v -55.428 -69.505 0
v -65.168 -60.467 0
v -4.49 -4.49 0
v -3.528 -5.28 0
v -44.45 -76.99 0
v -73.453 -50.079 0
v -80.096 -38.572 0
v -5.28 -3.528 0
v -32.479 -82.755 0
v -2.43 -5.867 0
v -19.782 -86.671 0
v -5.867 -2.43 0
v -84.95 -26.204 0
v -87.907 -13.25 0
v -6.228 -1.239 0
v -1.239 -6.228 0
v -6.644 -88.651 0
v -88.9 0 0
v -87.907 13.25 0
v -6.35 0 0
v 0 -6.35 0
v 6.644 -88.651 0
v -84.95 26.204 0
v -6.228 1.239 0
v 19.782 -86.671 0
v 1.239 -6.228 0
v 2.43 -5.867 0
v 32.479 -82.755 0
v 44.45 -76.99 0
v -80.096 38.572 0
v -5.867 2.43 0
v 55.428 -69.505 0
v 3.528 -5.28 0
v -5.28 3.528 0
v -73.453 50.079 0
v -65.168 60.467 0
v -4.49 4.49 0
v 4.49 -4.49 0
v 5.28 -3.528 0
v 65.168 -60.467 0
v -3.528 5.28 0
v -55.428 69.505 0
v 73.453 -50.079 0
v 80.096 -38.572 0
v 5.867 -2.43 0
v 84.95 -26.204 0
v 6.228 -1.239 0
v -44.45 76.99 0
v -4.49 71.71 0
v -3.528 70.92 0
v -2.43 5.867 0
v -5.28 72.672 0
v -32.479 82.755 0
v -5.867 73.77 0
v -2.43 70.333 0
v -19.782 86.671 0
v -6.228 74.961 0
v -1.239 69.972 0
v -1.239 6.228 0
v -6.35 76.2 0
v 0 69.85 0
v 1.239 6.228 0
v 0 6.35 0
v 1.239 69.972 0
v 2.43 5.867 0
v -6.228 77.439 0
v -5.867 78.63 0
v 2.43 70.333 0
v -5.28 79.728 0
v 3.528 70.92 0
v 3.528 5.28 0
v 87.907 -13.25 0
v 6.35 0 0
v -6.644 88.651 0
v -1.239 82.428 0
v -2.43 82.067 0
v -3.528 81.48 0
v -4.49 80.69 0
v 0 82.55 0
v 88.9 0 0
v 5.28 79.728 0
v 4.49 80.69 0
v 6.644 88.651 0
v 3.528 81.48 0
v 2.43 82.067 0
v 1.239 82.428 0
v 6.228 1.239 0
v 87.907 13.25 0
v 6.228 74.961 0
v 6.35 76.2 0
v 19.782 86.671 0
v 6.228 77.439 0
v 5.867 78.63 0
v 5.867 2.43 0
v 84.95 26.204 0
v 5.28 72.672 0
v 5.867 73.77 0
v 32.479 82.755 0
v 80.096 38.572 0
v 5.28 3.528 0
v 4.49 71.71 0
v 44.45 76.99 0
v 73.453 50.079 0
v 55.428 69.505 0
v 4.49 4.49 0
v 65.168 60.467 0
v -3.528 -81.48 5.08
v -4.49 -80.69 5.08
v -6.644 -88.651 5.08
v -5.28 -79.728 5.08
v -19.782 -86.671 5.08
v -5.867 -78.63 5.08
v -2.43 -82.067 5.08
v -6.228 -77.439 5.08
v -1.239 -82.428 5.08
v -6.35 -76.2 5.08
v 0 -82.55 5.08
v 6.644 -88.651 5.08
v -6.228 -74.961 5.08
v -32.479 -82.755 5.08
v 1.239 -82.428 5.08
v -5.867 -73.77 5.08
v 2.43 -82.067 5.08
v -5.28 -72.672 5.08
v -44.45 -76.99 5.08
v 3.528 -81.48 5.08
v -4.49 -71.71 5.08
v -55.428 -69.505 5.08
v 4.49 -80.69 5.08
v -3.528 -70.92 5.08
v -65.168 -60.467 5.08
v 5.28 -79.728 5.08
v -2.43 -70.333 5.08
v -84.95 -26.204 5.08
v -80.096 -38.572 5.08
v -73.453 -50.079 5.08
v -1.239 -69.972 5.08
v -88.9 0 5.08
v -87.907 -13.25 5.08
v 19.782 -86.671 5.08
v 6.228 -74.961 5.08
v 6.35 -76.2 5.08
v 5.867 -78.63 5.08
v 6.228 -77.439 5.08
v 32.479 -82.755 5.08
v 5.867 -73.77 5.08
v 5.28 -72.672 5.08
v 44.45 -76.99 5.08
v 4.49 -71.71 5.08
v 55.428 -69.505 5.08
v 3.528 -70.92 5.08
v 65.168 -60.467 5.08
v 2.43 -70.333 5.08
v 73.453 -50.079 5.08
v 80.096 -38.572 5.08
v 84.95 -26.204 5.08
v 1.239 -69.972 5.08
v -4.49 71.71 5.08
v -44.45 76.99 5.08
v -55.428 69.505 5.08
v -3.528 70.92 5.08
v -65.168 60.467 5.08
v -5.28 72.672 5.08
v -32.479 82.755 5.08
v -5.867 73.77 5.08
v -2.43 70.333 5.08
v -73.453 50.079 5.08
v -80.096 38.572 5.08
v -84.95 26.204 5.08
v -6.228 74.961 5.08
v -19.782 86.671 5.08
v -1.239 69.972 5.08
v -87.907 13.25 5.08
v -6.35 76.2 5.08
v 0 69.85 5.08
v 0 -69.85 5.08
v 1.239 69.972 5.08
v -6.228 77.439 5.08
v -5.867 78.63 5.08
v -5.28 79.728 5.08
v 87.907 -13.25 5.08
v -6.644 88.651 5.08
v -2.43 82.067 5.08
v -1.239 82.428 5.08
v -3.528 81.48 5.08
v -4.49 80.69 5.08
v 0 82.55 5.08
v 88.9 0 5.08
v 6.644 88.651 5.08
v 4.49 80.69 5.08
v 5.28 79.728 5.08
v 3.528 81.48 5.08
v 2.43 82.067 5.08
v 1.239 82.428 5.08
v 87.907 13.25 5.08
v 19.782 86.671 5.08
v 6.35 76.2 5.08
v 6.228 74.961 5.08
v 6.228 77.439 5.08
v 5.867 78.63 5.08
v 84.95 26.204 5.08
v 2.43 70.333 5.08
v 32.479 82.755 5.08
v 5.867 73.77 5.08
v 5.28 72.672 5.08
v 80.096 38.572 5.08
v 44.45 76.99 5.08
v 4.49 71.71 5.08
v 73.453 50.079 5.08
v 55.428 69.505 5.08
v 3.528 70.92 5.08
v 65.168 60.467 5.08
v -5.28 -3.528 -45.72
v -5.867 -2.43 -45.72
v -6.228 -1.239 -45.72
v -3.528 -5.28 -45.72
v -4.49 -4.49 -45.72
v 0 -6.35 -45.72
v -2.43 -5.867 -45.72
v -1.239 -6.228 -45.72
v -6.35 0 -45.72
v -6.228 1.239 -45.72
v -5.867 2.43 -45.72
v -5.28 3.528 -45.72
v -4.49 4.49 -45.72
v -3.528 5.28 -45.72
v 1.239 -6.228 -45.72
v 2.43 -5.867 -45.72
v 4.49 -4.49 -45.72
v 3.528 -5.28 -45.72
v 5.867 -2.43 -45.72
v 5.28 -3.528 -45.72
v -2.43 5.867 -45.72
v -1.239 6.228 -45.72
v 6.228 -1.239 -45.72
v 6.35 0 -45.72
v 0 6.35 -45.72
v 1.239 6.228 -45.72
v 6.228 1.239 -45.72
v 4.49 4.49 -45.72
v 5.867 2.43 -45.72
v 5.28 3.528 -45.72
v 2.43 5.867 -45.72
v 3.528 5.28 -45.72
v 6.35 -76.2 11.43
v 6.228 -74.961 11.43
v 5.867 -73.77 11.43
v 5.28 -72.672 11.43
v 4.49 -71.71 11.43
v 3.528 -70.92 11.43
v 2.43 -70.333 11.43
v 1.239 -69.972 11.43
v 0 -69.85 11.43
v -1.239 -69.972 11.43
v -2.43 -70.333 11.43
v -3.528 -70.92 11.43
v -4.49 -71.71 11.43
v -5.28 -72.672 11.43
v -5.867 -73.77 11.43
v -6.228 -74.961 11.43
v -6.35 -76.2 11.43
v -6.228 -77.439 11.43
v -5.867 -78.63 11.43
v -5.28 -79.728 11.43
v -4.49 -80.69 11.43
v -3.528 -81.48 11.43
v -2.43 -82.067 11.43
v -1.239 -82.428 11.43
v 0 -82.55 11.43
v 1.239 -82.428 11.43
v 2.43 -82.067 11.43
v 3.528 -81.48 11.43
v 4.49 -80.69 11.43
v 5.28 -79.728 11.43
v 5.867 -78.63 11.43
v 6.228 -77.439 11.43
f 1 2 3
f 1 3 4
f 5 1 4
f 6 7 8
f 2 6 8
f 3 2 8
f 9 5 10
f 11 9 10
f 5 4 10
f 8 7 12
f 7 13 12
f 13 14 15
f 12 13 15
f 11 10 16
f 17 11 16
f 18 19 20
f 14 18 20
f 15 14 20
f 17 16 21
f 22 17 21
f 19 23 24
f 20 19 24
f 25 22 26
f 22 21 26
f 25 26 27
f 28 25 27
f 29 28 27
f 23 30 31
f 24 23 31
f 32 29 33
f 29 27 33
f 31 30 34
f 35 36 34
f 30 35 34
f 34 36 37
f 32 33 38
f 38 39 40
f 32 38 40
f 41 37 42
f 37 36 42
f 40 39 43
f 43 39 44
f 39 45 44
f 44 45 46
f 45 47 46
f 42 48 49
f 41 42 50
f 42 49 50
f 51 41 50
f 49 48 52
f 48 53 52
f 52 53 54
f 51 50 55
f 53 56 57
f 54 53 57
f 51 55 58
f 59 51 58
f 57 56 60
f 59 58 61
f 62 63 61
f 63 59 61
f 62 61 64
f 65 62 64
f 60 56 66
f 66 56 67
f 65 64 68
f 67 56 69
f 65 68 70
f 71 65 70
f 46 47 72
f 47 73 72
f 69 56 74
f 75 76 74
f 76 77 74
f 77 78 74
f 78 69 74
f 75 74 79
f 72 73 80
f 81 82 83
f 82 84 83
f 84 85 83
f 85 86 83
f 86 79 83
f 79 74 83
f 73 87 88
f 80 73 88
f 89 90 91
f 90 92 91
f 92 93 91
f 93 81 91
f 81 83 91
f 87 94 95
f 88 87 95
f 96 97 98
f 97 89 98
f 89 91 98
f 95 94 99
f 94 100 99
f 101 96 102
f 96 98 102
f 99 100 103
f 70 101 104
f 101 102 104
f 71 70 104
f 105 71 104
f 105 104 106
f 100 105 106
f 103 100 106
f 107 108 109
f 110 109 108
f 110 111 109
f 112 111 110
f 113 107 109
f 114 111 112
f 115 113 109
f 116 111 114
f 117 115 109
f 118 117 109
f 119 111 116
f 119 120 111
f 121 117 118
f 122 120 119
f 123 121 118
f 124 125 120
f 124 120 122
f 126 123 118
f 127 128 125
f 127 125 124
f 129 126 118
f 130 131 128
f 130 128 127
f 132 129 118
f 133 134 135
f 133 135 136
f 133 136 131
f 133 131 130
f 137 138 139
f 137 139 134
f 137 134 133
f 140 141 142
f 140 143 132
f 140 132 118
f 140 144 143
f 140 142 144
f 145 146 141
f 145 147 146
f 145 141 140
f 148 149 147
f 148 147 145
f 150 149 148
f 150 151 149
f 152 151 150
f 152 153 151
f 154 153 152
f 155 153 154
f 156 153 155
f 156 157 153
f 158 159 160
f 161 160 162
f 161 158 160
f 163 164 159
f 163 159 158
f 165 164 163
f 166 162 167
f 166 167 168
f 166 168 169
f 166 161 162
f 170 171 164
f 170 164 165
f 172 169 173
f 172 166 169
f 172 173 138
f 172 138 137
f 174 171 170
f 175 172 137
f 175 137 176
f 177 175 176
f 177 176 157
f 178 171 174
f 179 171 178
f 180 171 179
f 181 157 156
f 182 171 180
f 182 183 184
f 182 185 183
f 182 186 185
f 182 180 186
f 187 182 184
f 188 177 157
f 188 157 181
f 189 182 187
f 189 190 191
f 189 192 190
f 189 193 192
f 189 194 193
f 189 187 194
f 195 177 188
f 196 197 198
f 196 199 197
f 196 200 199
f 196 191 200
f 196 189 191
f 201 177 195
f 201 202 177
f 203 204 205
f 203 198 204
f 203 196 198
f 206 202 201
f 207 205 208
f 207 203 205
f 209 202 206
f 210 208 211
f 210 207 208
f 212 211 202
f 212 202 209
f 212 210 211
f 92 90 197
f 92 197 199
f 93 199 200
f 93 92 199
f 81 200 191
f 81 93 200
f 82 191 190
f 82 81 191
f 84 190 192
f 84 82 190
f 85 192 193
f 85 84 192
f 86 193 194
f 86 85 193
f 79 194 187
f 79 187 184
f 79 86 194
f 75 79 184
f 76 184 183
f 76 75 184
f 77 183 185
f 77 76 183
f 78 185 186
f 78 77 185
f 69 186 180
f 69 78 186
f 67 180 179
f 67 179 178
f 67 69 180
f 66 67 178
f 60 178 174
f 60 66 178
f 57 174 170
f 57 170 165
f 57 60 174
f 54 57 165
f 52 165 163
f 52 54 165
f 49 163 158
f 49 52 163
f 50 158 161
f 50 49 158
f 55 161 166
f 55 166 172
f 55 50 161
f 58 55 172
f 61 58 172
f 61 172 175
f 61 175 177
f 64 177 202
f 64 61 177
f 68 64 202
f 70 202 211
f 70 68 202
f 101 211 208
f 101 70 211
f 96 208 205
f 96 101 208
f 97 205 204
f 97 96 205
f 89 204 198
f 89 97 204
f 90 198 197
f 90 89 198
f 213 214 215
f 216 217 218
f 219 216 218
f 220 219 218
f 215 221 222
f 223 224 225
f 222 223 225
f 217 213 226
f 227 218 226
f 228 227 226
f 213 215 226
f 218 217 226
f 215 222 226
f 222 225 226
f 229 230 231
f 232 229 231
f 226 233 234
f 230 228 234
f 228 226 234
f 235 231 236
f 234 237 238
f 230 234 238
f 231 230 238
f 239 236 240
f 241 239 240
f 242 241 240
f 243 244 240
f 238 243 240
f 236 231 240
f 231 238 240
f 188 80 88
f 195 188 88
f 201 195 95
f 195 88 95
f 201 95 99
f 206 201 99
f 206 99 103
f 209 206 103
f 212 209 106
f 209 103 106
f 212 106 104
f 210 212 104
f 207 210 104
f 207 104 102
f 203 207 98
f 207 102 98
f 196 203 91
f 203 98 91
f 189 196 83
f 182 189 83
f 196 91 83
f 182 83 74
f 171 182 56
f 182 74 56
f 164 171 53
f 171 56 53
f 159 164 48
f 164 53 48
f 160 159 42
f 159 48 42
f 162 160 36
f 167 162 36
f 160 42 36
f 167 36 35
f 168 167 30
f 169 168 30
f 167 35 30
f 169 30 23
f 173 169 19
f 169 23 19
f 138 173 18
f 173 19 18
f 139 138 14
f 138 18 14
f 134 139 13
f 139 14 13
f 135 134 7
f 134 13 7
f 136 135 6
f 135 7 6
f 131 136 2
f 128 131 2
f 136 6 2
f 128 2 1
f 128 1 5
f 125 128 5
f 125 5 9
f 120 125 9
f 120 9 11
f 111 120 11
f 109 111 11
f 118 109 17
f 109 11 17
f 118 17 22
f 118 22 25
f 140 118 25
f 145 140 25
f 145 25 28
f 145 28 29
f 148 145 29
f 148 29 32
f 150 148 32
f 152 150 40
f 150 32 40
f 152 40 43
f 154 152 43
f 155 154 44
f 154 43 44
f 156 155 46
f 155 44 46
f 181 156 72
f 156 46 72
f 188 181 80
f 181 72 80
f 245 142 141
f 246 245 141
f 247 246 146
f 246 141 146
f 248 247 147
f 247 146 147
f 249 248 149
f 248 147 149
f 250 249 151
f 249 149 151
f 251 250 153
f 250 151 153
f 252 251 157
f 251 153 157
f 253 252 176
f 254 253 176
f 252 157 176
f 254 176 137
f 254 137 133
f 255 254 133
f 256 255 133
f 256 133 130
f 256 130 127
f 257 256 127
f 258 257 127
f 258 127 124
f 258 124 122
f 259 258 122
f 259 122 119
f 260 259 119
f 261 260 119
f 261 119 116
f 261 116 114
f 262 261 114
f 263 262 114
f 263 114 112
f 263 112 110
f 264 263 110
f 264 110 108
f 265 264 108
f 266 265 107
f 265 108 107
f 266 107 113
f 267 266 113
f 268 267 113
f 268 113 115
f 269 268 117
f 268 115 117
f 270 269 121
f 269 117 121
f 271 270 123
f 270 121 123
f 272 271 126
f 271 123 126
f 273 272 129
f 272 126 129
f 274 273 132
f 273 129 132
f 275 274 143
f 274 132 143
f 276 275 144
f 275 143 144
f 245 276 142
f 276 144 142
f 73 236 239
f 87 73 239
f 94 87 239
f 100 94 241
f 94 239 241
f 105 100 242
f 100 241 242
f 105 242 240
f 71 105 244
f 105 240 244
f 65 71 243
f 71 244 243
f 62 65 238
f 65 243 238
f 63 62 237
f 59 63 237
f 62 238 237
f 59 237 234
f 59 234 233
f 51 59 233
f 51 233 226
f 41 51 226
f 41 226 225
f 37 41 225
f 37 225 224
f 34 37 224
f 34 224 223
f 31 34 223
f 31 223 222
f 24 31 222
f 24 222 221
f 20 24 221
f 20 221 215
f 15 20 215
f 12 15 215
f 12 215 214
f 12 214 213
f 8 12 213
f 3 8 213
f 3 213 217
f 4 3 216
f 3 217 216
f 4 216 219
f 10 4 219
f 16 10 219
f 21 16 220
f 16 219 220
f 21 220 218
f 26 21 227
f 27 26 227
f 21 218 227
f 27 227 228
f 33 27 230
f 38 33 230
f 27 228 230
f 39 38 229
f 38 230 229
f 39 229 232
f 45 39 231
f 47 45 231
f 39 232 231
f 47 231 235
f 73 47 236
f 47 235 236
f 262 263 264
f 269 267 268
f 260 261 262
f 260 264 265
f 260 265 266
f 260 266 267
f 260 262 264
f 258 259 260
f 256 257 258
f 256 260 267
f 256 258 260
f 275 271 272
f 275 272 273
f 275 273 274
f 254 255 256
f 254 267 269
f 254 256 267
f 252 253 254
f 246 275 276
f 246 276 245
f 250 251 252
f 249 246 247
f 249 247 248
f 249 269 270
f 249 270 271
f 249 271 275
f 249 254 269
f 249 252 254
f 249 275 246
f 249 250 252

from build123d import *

# Parameters (mm, degrees)
SKETCH1_R           = 88.9
SKETCH1_R_2         = 6.35
BOSS_EXTRUDE1_DEPTH = 5.08
SKETCH2_R           = 6.35
BOSS_EXTRUDE2_DEPTH = 11.43
BOSS_EXTRUDE3_START = -50.8
SKETCH3_R           = 6.35
BOSS_EXTRUDE3_DEPTH = 50.8


with BuildPart() as part:
    # Sketch1 → Boss-Extrude1 (new body)
    with BuildSketch(Plane.XY):
        Circle(SKETCH1_R)
        Circle(SKETCH1_R_2, mode=Mode.SUBTRACT)
        with Locations((0, -76.2)):
            Circle(SKETCH1_R_2, mode=Mode.SUBTRACT)
        with Locations((0, 76.2)):
            Circle(SKETCH1_R_2, mode=Mode.SUBTRACT)
    extrude(amount=BOSS_EXTRUDE1_DEPTH)

    # Sketch2 → Boss-Extrude2 (add)
    with BuildSketch(Plane.XY):
        with Locations((0, -76.2)):
            Circle(SKETCH2_R)
    extrude(amount=BOSS_EXTRUDE2_DEPTH)

    # Sketch3 → Boss-Extrude3 (add)
    with BuildSketch(Plane.XY.offset(5.08).offset(BOSS_EXTRUDE3_START)):
        Circle(SKETCH3_R)
    extrude(amount=BOSS_EXTRUDE3_DEPTH)


solid = part.part
